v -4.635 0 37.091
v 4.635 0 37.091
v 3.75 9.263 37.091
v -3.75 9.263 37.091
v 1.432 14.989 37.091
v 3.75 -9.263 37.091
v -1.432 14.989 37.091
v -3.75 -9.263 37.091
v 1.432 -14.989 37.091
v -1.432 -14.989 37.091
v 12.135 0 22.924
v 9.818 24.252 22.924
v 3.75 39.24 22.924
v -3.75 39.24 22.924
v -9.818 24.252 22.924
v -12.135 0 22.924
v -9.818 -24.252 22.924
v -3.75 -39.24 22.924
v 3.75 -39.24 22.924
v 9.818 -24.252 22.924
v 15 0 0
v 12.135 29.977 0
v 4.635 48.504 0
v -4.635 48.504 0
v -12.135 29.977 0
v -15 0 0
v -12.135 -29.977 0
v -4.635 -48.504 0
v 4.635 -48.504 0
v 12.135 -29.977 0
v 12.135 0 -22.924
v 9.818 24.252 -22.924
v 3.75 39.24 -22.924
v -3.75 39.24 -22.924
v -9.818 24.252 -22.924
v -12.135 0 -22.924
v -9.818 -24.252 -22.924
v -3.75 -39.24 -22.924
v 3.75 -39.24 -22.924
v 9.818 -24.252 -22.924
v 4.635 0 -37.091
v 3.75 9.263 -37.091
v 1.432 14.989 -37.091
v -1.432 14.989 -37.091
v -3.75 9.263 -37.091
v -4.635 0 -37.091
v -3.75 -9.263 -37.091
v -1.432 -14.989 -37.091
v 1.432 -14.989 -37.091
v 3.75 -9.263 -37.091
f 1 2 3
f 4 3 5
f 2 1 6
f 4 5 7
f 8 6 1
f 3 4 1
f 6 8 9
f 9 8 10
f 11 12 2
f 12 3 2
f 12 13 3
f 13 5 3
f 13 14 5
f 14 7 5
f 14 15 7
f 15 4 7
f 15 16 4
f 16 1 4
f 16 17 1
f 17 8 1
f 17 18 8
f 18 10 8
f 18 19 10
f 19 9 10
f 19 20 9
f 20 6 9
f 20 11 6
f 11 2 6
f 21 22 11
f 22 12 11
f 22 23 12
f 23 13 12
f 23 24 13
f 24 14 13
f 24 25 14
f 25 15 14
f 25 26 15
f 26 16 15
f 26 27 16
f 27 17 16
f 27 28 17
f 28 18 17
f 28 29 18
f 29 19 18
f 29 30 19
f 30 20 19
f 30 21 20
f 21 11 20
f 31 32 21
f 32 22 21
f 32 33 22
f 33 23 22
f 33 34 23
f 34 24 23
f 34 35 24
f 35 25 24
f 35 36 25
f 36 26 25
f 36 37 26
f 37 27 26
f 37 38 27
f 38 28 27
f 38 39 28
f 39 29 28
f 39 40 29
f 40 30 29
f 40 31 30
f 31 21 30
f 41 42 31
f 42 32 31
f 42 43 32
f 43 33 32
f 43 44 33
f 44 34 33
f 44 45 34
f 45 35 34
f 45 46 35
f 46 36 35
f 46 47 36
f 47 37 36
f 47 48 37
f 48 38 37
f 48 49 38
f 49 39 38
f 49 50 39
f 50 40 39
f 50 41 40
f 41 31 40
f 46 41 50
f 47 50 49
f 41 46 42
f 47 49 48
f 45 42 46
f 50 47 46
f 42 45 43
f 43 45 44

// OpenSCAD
// Generated by SolidPython 1.0.1 on 2020-07-29 00:46:47


scale(v = [5, 17, 13]) {
	sphere(r = 3);
}
/***********************************************
*********      SolidPython code:      **********
************************************************
 
# import packages: SolidPython
from solid import *
from solid.utils import *
from itertools import chain, combinations, permutations


class Resize:

    def __init__(self, scad_file):
        self.scad_file = scad_file
        #self.scad_file = import_scad(scad_file)
        # cone/cylinder param:
        self.r1 = 0
        self.r2 = 0
        self.h = 0
        # rectangular prism param:
        self.w = 0
        self.l = 0
        # ellipse param:
        self.r = 0

    # import OpenScad code (file name corresponds to shape)


    # classify shape + parameters
    def assign(self, param1, param2, param3):
        if self.scad_file == 'cone.scad':
            self.r1 = param1
            self.r2 = param2
            self.h = param3
        elif self.scad_file == 'cylinder.scad':
            self.r1 = param1
            self.r2 = param2
            self.h = param3
        elif self.scad_file == 'rectangularPrism.scad':
            self.h = param1
            self.l = param2
            self.w = param3
        else:
            self.r = param1
            self.h = param2

    # resize parameters
    def iterate(self):
        x = range(3, 20, 2)
        i = 1
        if self.scad_file == 'cone.scad':
            tempList = list(permutations(x, 2))
            for temp in tempList:
                param1 = temp[0]
                param2 = temp[1]
                filepath = 'produced_scad_files/' + 'cone' + str(param1) + '_' + str(param2) + '_' + '.scad'
                scad_render_to_file(cylinder(h=param1, r1=param2, r2=0), filepath)

        elif self.scad_file == 'cylinder.scad':
            tempList = list(permutations(x, 3))
            for temp in tempList:
                param1 = temp[0]
                param2 = temp[1]
                filepath = 'produced_scad_files/' + 'cylinder' + str(param1) + '_' + str(param2) + '_' + '.scad'
                scad_render_to_file(cylinder(h=param1, r1=param2, r2=param2), filepath)

        elif self.scad_file == 'rectangularPrism.scad':
            tempList = list(permutations(x, 3))
            for temp in tempList:
                param1 = temp[0]
                param2 = temp[1]
                param3 = temp[2]
                filepath = 'produced_scad_files/' + 'rectangularPrism' + str(param1) + '_' + str(param2) + '_' + str(
                    param3) + '.scad'
                scad_render_to_file(cube(size=(param1, param2, param3)), filepath)

        elif self.scad_file == 'ellipse.scad':
            tempList = list(permutations(x, 4))
            for temp in tempList:
                param1 = temp[0]
                param2 = temp[1]
                param3 = temp[2]
                param4 = temp[3]
                filepath = 'produced_scad_files/' + 'ellipse' + str(param1) + '_' + str(param2) + '_' + str(param3) + '_' + str(param4) + '.scad'
                scad_render_to_file(scale([param1, param2, param3])(sphere(r=param4)), filepath)

    def render_to_scadfile(self):
        scad_render_to_file(scad, 'example.scad') 
 
************************************************/
